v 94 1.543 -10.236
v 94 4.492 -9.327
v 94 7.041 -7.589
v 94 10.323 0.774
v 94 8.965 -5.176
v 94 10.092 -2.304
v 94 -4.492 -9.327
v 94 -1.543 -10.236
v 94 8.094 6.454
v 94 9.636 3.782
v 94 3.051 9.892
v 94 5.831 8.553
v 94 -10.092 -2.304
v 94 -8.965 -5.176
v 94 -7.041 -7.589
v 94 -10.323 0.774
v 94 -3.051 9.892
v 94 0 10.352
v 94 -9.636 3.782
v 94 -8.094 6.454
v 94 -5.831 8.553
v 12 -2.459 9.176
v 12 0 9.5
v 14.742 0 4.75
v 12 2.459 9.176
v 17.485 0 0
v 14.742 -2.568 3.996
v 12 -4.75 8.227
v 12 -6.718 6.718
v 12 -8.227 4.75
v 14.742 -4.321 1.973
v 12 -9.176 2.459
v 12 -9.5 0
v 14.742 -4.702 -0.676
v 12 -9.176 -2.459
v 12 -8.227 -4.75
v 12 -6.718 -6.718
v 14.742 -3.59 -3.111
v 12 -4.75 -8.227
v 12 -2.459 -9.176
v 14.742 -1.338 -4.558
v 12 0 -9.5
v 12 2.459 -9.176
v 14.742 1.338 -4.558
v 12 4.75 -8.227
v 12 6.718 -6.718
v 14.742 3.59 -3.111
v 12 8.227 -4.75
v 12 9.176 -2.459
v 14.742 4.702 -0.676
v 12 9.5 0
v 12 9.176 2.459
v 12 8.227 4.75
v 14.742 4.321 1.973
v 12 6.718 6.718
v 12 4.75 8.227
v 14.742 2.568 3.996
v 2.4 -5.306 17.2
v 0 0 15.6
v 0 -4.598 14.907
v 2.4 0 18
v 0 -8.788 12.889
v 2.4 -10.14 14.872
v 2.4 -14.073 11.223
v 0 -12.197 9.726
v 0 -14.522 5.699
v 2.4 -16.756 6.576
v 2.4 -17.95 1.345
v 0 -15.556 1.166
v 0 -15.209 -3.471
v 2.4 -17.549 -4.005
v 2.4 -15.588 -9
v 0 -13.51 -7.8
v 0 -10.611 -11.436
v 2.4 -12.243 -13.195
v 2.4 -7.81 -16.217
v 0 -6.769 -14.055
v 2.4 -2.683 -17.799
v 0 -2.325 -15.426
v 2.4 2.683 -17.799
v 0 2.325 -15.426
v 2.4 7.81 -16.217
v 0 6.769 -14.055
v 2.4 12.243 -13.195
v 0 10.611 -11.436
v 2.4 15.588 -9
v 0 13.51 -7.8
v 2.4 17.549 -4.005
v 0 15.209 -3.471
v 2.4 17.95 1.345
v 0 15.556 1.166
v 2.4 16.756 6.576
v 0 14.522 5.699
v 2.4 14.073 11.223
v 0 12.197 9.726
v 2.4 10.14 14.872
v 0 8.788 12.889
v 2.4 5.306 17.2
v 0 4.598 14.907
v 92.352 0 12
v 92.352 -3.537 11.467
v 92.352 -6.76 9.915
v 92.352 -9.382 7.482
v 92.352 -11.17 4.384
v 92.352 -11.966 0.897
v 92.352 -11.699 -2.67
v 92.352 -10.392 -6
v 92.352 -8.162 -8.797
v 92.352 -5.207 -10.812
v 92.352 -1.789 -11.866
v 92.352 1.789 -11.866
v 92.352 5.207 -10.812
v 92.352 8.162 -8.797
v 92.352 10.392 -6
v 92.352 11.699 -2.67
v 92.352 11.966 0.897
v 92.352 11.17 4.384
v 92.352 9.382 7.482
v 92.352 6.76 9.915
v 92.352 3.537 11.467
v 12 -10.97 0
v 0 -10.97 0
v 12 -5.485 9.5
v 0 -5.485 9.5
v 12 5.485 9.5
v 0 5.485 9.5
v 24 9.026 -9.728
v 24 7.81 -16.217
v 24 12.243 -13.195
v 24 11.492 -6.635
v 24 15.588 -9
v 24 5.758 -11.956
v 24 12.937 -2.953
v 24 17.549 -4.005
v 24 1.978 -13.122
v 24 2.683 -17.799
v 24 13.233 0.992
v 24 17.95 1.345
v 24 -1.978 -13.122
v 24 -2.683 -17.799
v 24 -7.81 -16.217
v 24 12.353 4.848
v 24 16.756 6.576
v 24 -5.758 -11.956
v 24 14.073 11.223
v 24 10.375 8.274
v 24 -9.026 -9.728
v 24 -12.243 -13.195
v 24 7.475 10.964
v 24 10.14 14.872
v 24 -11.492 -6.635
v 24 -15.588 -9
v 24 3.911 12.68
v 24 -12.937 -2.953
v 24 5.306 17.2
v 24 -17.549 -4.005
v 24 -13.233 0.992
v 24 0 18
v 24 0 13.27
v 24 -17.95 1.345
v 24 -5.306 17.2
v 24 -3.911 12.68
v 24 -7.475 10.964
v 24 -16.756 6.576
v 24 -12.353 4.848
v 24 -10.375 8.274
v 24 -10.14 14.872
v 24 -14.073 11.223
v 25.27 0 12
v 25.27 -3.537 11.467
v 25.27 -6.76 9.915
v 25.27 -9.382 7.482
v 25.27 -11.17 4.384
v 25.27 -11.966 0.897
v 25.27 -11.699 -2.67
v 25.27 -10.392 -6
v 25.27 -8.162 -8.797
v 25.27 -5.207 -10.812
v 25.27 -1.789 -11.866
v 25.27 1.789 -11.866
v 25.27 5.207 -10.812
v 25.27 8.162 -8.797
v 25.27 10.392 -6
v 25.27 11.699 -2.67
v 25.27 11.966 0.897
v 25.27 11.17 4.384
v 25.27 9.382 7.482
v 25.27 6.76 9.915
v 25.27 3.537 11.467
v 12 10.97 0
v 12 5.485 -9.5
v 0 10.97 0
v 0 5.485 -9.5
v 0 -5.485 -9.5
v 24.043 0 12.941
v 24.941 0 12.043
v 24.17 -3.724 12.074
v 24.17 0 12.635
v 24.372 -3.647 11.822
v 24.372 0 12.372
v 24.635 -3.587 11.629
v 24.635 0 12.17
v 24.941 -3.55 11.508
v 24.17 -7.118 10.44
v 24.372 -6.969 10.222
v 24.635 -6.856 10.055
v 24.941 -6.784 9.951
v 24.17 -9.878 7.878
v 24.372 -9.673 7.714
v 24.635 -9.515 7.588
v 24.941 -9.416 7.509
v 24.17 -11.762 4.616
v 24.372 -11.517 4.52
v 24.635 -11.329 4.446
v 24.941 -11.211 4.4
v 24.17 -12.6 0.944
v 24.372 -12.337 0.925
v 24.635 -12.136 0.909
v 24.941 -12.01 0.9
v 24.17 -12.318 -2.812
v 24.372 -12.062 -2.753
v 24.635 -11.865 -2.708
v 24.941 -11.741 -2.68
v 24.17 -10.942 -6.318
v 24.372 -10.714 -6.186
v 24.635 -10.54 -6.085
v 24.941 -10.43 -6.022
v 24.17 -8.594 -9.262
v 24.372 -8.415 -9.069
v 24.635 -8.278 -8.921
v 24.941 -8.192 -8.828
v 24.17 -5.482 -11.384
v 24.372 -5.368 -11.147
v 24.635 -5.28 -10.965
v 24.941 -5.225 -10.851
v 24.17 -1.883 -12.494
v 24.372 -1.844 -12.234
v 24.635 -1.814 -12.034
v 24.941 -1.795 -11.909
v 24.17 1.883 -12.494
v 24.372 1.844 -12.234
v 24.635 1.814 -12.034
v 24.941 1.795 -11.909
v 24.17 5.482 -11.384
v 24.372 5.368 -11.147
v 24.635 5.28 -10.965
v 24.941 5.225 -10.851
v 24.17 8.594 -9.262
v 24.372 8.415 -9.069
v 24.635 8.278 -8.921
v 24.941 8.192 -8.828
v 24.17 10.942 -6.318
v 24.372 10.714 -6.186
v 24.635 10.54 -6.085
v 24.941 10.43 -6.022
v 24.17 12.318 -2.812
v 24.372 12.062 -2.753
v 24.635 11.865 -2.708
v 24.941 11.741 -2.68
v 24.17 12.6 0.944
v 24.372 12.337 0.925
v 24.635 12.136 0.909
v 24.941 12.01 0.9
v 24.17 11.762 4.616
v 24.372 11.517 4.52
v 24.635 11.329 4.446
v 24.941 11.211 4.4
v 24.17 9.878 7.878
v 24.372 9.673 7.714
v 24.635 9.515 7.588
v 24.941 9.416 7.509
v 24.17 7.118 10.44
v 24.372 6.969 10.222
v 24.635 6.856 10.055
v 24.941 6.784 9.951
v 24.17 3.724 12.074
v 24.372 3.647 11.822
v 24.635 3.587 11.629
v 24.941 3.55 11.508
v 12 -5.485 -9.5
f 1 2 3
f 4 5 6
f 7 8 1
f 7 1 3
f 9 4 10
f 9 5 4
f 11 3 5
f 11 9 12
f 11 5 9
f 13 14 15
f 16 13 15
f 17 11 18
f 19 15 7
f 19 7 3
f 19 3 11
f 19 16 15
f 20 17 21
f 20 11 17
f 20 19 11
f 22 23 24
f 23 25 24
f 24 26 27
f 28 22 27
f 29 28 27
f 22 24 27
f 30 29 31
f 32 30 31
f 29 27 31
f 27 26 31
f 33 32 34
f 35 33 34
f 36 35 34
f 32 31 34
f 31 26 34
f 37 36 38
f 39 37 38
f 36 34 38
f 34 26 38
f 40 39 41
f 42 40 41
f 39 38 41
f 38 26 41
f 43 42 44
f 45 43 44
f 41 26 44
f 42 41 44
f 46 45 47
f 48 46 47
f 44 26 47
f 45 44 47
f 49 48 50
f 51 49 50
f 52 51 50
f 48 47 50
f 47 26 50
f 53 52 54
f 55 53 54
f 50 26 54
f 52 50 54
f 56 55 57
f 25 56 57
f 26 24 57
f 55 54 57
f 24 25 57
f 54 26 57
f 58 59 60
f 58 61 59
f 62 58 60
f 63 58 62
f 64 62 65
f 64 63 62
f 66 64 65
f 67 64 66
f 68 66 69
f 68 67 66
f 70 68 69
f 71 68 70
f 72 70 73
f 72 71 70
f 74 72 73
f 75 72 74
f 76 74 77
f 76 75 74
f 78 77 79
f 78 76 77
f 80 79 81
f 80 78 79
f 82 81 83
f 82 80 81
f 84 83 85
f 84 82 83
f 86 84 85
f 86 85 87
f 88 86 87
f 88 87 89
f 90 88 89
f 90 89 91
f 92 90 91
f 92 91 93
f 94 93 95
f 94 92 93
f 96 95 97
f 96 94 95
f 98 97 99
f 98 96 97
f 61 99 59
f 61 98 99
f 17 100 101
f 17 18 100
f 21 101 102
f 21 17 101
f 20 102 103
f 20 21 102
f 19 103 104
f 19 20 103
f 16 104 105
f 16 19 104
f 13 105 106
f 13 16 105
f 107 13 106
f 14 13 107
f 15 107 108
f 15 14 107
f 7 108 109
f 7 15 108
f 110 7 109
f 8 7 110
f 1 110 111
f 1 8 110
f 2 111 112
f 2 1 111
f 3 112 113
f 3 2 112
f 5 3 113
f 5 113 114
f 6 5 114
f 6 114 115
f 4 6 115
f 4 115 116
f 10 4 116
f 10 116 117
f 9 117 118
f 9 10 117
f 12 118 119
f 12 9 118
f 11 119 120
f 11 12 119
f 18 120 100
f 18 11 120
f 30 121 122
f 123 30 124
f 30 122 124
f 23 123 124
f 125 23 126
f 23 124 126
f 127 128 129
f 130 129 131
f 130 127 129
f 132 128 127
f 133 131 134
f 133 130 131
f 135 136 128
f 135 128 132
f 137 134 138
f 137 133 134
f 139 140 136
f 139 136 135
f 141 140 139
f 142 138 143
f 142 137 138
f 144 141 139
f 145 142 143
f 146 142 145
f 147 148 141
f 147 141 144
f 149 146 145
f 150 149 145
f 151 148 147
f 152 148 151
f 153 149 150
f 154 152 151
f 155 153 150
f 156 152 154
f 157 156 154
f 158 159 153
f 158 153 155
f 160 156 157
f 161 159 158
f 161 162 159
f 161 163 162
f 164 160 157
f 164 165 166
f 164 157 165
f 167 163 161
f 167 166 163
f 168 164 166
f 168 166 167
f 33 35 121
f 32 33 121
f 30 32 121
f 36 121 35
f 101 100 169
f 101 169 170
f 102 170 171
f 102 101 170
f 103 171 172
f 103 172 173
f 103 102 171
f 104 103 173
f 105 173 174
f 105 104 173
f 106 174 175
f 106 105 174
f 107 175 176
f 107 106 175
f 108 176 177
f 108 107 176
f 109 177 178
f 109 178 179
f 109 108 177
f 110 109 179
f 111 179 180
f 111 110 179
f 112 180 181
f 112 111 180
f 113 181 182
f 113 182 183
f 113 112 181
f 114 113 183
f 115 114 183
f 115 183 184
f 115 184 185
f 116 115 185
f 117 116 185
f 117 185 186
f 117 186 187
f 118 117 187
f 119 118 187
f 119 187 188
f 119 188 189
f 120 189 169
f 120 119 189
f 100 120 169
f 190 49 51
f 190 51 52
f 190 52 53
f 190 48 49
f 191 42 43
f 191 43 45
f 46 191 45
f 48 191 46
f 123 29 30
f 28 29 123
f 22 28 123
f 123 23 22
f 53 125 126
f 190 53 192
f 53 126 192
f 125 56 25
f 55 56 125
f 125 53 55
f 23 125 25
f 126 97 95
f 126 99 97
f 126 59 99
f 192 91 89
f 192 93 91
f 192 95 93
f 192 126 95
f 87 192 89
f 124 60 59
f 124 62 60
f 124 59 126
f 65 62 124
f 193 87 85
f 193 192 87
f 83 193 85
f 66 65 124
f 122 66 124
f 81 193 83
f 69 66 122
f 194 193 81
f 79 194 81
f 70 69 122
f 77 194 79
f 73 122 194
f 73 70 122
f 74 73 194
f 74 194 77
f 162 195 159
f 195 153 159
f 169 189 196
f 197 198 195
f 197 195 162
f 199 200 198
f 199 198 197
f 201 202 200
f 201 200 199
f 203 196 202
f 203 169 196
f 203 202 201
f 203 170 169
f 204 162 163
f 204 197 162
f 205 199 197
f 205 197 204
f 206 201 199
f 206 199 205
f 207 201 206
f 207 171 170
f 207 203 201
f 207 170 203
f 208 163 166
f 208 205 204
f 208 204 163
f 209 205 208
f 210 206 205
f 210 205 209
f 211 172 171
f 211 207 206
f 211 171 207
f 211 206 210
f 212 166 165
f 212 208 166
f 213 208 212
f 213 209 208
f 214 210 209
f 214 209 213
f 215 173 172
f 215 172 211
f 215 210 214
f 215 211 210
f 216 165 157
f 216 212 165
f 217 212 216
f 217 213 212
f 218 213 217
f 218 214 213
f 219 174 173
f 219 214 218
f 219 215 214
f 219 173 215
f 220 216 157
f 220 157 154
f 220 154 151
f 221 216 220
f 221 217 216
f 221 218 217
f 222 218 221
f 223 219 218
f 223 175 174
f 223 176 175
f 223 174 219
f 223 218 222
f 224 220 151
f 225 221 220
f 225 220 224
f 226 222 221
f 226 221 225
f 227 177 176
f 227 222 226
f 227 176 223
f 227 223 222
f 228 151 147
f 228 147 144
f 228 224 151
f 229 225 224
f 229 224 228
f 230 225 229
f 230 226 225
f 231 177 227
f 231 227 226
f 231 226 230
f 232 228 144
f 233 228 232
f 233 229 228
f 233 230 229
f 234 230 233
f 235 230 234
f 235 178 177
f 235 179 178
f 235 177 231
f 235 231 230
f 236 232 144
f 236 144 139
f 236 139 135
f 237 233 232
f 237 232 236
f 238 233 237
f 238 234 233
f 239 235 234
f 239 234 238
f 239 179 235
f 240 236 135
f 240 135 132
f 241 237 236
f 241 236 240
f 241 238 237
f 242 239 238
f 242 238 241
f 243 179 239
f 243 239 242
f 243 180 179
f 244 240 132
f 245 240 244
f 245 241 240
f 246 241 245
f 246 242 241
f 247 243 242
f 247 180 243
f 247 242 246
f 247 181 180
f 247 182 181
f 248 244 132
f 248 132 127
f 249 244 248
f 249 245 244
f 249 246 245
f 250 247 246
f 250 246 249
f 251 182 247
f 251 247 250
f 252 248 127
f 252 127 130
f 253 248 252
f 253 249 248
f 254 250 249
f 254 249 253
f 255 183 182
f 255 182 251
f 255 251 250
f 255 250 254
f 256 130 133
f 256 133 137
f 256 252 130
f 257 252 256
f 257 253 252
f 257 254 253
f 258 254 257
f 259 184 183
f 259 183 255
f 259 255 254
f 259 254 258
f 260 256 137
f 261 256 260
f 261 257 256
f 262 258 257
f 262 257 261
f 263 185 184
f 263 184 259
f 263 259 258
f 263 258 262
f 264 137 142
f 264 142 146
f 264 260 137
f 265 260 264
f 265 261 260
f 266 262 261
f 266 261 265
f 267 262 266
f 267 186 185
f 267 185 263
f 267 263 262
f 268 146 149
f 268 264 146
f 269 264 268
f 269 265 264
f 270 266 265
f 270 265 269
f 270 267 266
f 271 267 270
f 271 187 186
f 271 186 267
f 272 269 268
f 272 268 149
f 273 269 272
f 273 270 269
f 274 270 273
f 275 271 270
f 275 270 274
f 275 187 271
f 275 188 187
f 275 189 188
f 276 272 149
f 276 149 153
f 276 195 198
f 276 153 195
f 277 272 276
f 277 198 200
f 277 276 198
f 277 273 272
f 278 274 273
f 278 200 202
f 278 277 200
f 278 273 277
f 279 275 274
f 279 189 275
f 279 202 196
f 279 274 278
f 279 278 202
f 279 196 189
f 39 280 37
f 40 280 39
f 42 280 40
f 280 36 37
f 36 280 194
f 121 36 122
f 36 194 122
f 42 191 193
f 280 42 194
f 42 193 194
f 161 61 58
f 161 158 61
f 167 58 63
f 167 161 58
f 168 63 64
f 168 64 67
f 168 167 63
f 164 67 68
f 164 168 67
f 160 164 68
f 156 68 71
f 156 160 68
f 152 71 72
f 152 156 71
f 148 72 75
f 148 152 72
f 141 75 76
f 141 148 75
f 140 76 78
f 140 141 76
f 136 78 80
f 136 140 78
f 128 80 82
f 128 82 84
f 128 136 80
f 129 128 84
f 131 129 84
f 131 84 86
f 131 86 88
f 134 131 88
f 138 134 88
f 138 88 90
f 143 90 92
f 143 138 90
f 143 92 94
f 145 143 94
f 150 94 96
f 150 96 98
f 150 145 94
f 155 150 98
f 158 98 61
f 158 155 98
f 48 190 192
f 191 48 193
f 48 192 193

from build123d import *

# Parameters (mm, degrees)
FILLET1_R   = 1.27
HEX_2_DEPTH = 12


with BuildPart() as part:
    # BodySke → Base-Revolve (revolve)
    with BuildSketch(Plane.XY, mode=Mode.PRIVATE) as base_revolve_sk:
        Polygon((0, 0), (0, 15.6), (2.4, 18), (24, 18), (24, 12), (92.352, 12), (94, 10.352), (94, 0), align=None)
    revolve(base_revolve_sk.sketch.rotate(Axis((-31.75, 0, 0), (1, 0, 0)), 90), axis=Axis((-31.75, 0, 0), (1, 0, 0)))  # turned: the seam where the file's is

    # Fillet1
    fillet1_edges = [part.edges().sort_by_distance(p)[0] for p in [
        (24, 0, -12),
    ]]
    fillet(fillet1_edges, radius=FILLET1_R)

    # Sketch2 → Hex-PreBroach (revolve, cut)
    with BuildSketch(Plane.XY, mode=Mode.PRIVATE) as hex_prebroach_sk:
        Polygon((0, 9.5), (12, 9.5), (17.484827557, 0), (0, 0), align=None)
    revolve(hex_prebroach_sk.sketch.rotate(Axis((0, 0, 0), (1, 0, 0)), 90), axis=Axis((0, 0, 0), (1, 0, 0)), mode=Mode.SUBTRACT)  # turned: the seam where the file's is

    # Sketch3 → Hex 2 (cut)
    with BuildSketch(Plane(origin=(0, 0, 0), x_dir=(0, 0.5, 0.866025404), z_dir=(-1, 0, 0))):
        Polygon((5.484827557, 9.5), (-5.484827557, 9.5), (-10.969655115, 0), (-5.484827557, -9.5), (5.484827557, -9.5), (10.969655115, 0), align=None)
    extrude(amount=-HEX_2_DEPTH, mode=Mode.SUBTRACT)


solid = part.part
